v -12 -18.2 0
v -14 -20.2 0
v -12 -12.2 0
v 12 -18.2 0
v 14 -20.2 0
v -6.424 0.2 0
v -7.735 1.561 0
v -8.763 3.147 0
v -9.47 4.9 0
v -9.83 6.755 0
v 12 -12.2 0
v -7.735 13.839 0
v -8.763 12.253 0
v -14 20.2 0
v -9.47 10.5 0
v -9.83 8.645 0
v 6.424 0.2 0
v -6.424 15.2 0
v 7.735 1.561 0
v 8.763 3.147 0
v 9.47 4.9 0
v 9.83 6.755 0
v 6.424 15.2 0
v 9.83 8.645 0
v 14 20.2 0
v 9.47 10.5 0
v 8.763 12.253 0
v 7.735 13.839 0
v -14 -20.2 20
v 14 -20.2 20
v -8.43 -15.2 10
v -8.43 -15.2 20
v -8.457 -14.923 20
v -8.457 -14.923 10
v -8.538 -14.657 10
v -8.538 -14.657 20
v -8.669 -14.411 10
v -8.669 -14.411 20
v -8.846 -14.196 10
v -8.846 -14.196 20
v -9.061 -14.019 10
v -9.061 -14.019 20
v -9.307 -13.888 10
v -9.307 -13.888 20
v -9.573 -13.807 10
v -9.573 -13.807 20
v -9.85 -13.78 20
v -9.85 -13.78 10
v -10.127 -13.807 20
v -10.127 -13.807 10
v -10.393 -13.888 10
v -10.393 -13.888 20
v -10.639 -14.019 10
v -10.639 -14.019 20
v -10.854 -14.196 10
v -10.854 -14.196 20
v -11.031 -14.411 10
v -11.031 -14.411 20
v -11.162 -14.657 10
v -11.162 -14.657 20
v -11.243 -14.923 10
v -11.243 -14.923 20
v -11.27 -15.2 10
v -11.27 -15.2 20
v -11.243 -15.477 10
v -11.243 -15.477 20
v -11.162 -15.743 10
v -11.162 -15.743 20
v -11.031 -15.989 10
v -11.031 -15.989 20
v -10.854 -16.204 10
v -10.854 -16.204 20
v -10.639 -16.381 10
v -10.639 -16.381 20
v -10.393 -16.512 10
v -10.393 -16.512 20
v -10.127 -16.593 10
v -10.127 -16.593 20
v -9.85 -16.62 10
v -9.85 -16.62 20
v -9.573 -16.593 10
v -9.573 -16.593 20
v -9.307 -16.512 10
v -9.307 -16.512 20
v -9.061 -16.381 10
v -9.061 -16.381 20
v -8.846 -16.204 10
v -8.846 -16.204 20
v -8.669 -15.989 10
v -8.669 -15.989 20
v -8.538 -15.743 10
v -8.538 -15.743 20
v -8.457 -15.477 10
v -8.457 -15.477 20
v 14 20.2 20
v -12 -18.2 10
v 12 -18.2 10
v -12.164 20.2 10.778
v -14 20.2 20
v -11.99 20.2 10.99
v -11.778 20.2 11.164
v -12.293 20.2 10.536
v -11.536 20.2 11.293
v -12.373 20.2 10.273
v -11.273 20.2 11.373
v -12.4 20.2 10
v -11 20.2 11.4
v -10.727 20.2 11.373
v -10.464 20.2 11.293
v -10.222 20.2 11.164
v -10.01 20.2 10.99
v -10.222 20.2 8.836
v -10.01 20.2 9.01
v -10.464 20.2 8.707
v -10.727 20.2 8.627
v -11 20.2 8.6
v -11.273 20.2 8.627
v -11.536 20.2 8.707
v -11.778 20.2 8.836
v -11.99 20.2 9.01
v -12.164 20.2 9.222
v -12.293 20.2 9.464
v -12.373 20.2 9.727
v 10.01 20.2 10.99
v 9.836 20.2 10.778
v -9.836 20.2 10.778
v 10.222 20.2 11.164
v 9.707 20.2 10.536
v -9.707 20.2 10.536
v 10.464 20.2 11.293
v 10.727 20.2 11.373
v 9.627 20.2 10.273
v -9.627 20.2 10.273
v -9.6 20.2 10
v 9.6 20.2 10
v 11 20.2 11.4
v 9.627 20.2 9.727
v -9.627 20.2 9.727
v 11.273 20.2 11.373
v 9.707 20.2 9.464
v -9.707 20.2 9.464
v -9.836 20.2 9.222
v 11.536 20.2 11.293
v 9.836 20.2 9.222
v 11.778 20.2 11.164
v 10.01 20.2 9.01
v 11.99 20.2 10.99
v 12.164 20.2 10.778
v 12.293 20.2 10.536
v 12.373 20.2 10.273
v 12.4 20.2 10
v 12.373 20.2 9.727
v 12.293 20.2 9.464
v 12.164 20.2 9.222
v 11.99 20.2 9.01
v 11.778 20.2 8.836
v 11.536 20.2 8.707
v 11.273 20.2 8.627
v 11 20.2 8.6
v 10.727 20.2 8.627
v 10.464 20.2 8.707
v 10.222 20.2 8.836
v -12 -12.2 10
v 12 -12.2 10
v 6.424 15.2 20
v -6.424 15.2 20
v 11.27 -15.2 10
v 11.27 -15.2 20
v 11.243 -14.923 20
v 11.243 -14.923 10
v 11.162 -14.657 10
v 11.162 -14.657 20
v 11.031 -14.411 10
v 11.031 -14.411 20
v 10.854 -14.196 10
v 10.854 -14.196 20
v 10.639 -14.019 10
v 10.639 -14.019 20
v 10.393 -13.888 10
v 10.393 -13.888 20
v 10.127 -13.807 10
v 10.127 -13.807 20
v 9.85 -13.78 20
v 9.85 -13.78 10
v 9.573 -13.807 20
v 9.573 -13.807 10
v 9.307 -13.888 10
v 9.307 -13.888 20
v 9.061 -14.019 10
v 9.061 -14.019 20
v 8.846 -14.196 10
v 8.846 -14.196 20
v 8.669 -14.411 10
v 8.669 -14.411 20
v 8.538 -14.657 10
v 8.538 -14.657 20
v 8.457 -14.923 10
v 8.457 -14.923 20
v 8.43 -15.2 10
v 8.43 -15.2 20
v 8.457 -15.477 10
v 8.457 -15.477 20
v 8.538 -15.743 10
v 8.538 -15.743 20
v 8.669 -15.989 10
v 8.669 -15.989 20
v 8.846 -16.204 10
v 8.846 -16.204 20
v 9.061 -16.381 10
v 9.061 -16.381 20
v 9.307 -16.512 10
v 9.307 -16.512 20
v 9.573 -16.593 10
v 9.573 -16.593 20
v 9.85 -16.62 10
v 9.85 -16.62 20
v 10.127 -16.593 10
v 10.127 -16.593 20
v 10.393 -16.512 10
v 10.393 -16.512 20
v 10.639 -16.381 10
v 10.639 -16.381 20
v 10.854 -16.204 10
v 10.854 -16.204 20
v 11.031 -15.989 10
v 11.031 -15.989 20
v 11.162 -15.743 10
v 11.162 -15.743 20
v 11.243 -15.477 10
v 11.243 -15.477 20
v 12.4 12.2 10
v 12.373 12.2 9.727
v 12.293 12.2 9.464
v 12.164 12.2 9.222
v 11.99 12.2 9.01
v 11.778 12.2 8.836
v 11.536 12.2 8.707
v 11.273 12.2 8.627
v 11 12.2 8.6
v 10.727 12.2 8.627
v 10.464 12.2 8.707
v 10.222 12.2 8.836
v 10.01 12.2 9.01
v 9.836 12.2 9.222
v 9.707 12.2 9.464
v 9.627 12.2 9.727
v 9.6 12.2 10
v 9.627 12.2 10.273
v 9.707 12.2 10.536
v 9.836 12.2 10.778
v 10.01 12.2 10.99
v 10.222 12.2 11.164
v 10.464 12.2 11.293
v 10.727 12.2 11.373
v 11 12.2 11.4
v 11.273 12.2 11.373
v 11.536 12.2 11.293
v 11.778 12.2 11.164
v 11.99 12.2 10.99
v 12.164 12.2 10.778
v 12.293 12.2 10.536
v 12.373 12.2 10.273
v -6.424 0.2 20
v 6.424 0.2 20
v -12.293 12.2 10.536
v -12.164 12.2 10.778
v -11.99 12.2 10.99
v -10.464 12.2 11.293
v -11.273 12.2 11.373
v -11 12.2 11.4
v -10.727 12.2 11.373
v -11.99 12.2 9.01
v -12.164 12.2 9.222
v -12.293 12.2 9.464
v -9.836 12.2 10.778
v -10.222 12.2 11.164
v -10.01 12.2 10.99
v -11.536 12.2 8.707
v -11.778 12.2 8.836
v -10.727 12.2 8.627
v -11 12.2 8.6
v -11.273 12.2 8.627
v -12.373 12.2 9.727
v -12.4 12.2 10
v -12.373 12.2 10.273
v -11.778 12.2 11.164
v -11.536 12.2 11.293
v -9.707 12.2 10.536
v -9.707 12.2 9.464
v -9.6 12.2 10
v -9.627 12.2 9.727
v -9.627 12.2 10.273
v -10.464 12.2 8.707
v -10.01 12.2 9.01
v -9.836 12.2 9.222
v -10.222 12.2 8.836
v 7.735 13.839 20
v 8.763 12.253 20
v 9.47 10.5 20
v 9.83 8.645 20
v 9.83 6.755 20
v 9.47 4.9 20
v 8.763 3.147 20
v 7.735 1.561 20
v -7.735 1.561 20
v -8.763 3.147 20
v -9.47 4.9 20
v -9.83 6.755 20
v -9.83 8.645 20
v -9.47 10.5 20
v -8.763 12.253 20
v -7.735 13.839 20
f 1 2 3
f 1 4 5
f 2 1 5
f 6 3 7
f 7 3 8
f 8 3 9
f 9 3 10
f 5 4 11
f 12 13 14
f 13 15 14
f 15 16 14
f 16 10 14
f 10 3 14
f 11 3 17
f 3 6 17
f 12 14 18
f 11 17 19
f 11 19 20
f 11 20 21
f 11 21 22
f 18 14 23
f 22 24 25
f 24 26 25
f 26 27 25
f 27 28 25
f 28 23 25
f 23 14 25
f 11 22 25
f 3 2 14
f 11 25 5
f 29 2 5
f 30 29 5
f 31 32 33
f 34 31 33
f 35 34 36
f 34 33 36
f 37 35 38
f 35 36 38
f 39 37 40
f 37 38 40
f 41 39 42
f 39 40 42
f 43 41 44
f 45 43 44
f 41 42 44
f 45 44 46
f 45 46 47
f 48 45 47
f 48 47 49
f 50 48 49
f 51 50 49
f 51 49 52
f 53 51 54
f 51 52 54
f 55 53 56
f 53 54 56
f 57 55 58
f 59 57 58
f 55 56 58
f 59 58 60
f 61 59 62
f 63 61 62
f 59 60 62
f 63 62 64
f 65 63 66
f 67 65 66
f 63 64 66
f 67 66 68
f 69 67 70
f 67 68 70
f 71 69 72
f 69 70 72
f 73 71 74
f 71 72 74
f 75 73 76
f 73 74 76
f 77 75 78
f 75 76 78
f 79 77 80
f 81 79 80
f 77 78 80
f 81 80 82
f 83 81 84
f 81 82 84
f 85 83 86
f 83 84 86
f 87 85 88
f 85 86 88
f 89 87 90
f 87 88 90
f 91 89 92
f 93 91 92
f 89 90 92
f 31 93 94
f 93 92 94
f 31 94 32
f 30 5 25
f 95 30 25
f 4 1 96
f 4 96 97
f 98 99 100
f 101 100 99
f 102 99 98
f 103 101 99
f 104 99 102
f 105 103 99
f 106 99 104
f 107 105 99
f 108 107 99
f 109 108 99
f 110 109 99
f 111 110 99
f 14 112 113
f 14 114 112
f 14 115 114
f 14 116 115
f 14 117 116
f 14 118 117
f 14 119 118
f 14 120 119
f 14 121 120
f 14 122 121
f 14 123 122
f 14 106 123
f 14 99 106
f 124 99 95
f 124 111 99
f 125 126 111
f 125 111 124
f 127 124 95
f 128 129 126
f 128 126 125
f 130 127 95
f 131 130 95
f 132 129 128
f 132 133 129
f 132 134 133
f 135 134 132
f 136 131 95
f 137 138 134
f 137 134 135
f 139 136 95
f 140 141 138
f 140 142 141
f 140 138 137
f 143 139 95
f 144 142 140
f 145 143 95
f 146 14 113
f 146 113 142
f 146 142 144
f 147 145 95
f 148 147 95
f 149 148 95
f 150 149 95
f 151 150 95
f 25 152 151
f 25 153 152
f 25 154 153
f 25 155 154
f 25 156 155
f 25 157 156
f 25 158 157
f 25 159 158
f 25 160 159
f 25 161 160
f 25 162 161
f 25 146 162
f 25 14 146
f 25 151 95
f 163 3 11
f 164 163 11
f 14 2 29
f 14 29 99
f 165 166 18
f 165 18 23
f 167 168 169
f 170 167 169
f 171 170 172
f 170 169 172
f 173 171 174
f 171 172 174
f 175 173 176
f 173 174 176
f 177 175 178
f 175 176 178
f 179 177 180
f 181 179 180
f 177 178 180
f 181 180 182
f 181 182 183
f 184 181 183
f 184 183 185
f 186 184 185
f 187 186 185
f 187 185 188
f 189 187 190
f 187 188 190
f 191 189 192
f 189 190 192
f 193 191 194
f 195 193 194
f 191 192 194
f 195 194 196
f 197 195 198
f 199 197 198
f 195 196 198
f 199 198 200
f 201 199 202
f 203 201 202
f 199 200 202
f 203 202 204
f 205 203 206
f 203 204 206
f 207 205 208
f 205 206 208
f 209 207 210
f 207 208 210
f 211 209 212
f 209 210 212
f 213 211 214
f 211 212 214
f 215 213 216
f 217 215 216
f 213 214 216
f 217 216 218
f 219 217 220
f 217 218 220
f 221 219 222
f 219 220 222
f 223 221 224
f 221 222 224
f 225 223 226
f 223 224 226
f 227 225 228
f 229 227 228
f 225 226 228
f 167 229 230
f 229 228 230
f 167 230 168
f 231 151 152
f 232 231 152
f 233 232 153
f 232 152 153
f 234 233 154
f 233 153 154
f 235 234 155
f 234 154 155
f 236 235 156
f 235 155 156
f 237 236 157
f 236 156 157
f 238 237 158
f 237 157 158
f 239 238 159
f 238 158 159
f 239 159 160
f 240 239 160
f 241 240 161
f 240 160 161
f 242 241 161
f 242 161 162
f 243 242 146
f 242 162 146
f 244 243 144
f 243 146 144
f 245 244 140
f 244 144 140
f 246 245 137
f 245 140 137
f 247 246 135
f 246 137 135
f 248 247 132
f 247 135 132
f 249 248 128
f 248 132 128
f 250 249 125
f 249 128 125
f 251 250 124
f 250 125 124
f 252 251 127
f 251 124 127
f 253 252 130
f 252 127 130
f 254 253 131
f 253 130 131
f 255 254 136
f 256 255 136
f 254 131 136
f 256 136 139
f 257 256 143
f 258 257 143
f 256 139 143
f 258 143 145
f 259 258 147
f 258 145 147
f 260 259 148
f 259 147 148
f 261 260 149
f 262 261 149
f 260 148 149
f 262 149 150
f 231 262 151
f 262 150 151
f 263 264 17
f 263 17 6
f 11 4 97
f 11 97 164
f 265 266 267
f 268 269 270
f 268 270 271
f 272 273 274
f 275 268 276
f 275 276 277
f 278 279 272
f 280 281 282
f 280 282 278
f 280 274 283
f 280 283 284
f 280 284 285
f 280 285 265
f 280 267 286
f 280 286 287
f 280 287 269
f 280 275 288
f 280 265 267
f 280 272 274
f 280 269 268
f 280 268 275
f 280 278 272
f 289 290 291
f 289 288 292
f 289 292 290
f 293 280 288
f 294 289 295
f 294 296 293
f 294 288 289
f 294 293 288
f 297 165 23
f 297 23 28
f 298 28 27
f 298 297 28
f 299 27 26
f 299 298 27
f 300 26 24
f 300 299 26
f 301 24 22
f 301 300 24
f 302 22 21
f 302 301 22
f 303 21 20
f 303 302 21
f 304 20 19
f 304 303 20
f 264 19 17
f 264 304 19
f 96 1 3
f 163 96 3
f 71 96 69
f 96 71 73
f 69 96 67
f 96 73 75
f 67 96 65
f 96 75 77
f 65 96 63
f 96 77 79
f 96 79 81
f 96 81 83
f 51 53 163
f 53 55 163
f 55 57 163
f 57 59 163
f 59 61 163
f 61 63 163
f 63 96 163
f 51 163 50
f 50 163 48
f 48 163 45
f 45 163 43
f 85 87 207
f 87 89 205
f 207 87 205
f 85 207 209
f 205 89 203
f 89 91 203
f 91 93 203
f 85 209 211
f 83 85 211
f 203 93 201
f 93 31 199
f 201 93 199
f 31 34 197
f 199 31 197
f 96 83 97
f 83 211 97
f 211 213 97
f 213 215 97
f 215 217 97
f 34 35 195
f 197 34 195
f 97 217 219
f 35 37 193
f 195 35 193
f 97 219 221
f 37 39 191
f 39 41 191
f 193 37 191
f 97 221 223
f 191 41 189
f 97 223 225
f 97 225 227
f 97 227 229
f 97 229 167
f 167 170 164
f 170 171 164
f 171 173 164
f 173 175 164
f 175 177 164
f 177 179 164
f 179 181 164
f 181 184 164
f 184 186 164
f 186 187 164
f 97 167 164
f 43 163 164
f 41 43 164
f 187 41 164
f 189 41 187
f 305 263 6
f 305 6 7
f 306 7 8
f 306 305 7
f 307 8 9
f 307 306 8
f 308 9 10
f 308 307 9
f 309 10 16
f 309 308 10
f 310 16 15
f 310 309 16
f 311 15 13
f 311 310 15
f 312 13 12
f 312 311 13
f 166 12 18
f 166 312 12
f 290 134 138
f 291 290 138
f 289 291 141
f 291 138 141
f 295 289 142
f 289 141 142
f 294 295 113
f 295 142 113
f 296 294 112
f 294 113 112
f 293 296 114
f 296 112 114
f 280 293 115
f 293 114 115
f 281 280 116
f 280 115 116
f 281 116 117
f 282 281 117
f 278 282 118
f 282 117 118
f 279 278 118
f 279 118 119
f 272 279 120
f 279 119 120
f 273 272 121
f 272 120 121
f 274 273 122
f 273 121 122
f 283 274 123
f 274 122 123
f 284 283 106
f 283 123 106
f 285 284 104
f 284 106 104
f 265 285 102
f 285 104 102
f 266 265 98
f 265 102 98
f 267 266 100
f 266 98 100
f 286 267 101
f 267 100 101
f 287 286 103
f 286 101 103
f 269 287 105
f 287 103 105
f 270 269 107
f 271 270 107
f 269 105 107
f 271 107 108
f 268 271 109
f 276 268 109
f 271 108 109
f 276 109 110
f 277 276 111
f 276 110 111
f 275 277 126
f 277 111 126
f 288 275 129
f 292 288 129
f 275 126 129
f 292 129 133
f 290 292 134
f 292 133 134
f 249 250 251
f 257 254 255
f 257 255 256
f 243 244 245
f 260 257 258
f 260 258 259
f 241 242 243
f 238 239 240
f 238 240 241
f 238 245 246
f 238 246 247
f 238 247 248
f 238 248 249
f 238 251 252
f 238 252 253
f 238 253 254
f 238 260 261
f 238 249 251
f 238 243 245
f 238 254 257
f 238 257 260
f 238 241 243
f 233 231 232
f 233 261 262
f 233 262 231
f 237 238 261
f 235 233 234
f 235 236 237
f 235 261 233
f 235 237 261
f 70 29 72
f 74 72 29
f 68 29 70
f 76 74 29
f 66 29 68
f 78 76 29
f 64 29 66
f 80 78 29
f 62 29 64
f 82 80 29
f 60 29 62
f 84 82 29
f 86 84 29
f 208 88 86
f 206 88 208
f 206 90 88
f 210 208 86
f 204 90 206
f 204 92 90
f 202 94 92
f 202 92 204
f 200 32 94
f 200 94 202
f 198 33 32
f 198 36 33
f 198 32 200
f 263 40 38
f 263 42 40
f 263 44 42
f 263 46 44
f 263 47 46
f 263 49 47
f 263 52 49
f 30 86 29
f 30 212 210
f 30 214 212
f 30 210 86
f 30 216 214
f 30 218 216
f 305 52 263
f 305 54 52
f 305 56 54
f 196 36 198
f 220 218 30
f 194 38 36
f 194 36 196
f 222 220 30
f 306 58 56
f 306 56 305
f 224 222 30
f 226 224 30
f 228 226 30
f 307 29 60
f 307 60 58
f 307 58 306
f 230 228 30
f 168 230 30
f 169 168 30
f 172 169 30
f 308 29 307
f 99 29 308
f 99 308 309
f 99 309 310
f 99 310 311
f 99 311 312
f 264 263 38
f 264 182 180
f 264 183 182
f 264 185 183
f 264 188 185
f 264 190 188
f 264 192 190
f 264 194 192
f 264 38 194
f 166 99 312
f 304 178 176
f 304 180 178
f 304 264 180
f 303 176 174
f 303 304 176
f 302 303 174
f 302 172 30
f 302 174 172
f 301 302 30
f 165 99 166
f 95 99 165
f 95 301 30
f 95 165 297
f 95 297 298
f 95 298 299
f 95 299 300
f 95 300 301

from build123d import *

# Parameters (mm, degrees)
SKETCH4_W           = 28
SKETCH4_H           = 40.4
BOSS_EXTRUDE1_DEPTH = 20
CUT_EXTRUDE1_DEPTH  = 21
SKETCH6_R           = 1.42
CUT_EXTRUDE3_DEPTH  = 10
SKETCH7_W           = 24
SKETCH7_H           = 6
CUT_EXTRUDE4_DEPTH  = 10
SKETCH8_R           = 1.4
CUT_EXTRUDE5_DEPTH  = 8


with BuildPart() as part:
    # Sketch4 → Boss-Extrude1 (new body)
    with BuildSketch(Plane.XY):
        Rectangle(SKETCH4_W, SKETCH4_H)
    extrude(amount=BOSS_EXTRUDE1_DEPTH)

    # Sketch5 → Cut-Extrude1 (cut, through all)
    with BuildSketch(Plane.XY.offset(20)):
        with BuildLine():
            Line((-6.423832579, 15.2), (6.423832579, 15.2))
            ThreePointArc((6.423832579, 15.2), (9.875, 7.7), (6.423832579, 0.2))
            Line((6.423832579, 0.2), (-6.423832579, 0.2))
            ThreePointArc((-6.423832579, 0.2), (-9.875, 7.7), (-6.423832579, 15.2))
        make_face()
    extrude(amount=-CUT_EXTRUDE1_DEPTH, mode=Mode.SUBTRACT)

    # Sketch6 → Cut-Extrude3 (cut)
    with BuildSketch(Plane.XY.offset(20)):
        with Locations((-9.85, -15.2)):
            Circle(SKETCH6_R)
        with Locations((9.85, -15.2)):
            Circle(SKETCH6_R)
    extrude(amount=-CUT_EXTRUDE3_DEPTH, mode=Mode.SUBTRACT)

    # Sketch7 → Cut-Extrude4 (cut)
    with BuildSketch(Plane.XY):
        with Locations((0, -15.2)):
            Rectangle(SKETCH7_W, SKETCH7_H)
    extrude(amount=CUT_EXTRUDE4_DEPTH, mode=Mode.SUBTRACT)

    # Sketch8 → Cut-Extrude5 (cut)
    with BuildSketch(Plane(origin=(0, 20.2, 0), x_dir=(1, 0, 0), z_dir=(0, 1, 0))):
        with Locations((-11, -10)):
            Circle(SKETCH8_R)
        with Locations((11, -10)):
            Circle(SKETCH8_R)
    extrude(amount=-CUT_EXTRUDE5_DEPTH, mode=Mode.SUBTRACT)


solid = part.part
